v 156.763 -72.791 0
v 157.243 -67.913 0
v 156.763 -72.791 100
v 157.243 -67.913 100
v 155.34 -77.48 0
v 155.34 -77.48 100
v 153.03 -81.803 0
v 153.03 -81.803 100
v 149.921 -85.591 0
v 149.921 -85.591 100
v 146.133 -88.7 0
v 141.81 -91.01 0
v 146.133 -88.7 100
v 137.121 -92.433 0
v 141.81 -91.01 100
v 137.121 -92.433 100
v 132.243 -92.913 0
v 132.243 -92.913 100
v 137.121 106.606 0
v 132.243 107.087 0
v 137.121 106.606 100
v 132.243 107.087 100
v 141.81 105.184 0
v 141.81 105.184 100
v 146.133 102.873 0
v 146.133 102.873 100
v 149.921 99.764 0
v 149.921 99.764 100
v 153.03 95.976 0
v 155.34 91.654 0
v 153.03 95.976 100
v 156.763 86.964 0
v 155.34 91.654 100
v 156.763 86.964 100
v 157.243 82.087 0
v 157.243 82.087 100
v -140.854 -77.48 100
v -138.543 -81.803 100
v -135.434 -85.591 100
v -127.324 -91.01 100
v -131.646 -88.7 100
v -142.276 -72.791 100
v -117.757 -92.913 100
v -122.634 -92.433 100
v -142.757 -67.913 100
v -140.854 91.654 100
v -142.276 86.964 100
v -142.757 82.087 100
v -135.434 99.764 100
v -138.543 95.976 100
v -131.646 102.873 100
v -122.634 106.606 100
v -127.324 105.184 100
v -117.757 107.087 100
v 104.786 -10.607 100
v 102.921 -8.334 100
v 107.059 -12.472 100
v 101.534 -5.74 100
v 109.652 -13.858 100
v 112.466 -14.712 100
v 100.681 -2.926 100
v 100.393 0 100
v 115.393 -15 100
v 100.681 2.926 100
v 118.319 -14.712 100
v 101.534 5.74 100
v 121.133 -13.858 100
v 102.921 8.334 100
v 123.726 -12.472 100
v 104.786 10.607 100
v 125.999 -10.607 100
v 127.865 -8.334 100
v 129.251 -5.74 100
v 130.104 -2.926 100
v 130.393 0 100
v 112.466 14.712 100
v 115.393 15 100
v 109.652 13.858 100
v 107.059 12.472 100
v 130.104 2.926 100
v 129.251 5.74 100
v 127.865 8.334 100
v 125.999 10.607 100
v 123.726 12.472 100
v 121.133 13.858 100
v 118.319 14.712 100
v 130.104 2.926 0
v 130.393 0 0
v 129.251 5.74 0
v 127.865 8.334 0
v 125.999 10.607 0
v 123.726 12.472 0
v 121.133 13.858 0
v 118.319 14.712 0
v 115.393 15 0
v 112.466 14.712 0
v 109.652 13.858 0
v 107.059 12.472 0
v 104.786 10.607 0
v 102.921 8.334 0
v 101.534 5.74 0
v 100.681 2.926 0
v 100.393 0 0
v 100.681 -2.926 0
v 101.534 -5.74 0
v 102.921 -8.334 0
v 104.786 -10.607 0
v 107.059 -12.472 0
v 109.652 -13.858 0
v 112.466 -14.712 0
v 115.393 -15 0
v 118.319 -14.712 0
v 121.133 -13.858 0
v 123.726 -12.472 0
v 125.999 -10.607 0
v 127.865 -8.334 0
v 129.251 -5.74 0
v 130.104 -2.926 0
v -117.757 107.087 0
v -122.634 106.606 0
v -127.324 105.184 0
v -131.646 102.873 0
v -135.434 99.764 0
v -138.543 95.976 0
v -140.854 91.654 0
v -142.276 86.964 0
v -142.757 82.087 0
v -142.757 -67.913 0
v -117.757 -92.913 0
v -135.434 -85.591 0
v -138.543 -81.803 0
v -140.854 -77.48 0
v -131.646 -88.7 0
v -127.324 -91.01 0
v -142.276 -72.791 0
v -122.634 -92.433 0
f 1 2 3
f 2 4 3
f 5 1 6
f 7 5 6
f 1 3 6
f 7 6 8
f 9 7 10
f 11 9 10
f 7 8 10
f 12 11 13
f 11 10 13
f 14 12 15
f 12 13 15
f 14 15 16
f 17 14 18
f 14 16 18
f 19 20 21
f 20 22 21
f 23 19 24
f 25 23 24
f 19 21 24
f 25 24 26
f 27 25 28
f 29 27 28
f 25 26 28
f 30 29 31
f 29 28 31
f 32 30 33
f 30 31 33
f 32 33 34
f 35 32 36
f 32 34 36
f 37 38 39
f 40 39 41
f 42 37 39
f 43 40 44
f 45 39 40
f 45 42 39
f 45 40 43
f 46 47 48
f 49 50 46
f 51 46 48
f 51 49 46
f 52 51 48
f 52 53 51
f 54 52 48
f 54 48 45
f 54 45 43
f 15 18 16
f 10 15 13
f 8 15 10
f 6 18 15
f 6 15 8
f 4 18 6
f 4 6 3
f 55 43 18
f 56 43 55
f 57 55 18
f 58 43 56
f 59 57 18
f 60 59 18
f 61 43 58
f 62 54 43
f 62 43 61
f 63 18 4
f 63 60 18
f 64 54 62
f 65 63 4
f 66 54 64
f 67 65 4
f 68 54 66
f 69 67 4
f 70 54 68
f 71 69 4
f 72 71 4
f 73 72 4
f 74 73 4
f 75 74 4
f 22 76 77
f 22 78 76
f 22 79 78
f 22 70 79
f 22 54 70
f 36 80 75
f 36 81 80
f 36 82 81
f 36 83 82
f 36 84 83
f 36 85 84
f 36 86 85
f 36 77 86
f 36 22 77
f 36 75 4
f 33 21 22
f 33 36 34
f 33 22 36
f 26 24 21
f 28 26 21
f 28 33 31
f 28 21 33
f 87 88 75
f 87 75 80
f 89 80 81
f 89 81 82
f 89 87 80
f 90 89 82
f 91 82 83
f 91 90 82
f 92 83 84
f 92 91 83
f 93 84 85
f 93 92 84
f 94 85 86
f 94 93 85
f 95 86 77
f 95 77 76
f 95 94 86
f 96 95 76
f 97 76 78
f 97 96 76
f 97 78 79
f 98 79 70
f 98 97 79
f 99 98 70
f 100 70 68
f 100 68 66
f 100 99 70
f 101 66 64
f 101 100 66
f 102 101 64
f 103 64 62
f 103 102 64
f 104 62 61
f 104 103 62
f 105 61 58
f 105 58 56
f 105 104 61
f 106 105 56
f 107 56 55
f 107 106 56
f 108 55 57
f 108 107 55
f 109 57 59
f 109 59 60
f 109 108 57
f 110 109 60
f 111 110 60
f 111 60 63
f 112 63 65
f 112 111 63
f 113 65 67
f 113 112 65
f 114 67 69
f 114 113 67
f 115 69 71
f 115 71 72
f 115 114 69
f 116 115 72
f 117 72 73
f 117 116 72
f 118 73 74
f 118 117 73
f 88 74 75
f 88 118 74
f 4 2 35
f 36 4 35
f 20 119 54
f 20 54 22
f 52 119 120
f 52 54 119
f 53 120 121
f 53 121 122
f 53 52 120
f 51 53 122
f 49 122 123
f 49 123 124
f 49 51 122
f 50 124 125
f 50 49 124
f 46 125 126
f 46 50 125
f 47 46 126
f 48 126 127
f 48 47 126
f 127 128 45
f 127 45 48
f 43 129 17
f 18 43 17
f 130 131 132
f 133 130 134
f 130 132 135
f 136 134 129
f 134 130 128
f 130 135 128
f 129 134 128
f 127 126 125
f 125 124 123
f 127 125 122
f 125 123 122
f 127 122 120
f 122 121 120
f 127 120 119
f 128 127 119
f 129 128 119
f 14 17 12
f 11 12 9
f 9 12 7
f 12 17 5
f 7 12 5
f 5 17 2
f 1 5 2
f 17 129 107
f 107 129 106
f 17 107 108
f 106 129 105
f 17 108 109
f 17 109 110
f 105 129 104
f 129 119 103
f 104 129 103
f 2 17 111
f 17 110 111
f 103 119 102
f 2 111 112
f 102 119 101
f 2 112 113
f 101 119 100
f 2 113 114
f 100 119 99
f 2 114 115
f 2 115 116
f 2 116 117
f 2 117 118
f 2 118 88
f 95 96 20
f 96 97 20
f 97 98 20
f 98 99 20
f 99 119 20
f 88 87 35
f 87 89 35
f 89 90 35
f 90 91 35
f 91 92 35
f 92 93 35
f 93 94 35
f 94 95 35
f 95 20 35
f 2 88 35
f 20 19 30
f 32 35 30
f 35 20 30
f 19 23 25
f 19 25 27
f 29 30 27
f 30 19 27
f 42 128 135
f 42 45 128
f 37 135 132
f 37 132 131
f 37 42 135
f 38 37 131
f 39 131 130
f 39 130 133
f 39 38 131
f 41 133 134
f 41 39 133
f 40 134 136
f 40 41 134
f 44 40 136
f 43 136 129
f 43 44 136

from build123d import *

# Parameters (mm, degrees)
F0_W     = 300
F0_H     = 200
F0_R     = 15
F1_DEPTH = 100
F2_R     = 25
F3_R     = 25


with BuildPart() as f1:
    # F0 (on Top) → F1 (new body)
    with BuildSketch(Plane.XY):
        with Locations((7.243371, 7.086681)):
            Rectangle(F0_W, F0_H)
        with Locations((115.392633, 0)):
            Circle(F0_R, mode=Mode.SUBTRACT)
    extrude(amount=F1_DEPTH)

    # F2
    f2_edges = [f1.edges().sort_by_distance(p)[0] for p in [
        (157.243371, 107.086681, 50),
    ]]
    fillet(f2_edges, radius=F2_R)

    # F3
    f3_edges = [f1.edges().sort_by_distance(p)[0] for p in [
        (-142.756629, 107.086681, 50),
        (-142.756629, -92.913319, 50),
        (157.243371, -92.913319, 50),
    ]]
    fillet(f3_edges, radius=F3_R)


solid = f1.part
